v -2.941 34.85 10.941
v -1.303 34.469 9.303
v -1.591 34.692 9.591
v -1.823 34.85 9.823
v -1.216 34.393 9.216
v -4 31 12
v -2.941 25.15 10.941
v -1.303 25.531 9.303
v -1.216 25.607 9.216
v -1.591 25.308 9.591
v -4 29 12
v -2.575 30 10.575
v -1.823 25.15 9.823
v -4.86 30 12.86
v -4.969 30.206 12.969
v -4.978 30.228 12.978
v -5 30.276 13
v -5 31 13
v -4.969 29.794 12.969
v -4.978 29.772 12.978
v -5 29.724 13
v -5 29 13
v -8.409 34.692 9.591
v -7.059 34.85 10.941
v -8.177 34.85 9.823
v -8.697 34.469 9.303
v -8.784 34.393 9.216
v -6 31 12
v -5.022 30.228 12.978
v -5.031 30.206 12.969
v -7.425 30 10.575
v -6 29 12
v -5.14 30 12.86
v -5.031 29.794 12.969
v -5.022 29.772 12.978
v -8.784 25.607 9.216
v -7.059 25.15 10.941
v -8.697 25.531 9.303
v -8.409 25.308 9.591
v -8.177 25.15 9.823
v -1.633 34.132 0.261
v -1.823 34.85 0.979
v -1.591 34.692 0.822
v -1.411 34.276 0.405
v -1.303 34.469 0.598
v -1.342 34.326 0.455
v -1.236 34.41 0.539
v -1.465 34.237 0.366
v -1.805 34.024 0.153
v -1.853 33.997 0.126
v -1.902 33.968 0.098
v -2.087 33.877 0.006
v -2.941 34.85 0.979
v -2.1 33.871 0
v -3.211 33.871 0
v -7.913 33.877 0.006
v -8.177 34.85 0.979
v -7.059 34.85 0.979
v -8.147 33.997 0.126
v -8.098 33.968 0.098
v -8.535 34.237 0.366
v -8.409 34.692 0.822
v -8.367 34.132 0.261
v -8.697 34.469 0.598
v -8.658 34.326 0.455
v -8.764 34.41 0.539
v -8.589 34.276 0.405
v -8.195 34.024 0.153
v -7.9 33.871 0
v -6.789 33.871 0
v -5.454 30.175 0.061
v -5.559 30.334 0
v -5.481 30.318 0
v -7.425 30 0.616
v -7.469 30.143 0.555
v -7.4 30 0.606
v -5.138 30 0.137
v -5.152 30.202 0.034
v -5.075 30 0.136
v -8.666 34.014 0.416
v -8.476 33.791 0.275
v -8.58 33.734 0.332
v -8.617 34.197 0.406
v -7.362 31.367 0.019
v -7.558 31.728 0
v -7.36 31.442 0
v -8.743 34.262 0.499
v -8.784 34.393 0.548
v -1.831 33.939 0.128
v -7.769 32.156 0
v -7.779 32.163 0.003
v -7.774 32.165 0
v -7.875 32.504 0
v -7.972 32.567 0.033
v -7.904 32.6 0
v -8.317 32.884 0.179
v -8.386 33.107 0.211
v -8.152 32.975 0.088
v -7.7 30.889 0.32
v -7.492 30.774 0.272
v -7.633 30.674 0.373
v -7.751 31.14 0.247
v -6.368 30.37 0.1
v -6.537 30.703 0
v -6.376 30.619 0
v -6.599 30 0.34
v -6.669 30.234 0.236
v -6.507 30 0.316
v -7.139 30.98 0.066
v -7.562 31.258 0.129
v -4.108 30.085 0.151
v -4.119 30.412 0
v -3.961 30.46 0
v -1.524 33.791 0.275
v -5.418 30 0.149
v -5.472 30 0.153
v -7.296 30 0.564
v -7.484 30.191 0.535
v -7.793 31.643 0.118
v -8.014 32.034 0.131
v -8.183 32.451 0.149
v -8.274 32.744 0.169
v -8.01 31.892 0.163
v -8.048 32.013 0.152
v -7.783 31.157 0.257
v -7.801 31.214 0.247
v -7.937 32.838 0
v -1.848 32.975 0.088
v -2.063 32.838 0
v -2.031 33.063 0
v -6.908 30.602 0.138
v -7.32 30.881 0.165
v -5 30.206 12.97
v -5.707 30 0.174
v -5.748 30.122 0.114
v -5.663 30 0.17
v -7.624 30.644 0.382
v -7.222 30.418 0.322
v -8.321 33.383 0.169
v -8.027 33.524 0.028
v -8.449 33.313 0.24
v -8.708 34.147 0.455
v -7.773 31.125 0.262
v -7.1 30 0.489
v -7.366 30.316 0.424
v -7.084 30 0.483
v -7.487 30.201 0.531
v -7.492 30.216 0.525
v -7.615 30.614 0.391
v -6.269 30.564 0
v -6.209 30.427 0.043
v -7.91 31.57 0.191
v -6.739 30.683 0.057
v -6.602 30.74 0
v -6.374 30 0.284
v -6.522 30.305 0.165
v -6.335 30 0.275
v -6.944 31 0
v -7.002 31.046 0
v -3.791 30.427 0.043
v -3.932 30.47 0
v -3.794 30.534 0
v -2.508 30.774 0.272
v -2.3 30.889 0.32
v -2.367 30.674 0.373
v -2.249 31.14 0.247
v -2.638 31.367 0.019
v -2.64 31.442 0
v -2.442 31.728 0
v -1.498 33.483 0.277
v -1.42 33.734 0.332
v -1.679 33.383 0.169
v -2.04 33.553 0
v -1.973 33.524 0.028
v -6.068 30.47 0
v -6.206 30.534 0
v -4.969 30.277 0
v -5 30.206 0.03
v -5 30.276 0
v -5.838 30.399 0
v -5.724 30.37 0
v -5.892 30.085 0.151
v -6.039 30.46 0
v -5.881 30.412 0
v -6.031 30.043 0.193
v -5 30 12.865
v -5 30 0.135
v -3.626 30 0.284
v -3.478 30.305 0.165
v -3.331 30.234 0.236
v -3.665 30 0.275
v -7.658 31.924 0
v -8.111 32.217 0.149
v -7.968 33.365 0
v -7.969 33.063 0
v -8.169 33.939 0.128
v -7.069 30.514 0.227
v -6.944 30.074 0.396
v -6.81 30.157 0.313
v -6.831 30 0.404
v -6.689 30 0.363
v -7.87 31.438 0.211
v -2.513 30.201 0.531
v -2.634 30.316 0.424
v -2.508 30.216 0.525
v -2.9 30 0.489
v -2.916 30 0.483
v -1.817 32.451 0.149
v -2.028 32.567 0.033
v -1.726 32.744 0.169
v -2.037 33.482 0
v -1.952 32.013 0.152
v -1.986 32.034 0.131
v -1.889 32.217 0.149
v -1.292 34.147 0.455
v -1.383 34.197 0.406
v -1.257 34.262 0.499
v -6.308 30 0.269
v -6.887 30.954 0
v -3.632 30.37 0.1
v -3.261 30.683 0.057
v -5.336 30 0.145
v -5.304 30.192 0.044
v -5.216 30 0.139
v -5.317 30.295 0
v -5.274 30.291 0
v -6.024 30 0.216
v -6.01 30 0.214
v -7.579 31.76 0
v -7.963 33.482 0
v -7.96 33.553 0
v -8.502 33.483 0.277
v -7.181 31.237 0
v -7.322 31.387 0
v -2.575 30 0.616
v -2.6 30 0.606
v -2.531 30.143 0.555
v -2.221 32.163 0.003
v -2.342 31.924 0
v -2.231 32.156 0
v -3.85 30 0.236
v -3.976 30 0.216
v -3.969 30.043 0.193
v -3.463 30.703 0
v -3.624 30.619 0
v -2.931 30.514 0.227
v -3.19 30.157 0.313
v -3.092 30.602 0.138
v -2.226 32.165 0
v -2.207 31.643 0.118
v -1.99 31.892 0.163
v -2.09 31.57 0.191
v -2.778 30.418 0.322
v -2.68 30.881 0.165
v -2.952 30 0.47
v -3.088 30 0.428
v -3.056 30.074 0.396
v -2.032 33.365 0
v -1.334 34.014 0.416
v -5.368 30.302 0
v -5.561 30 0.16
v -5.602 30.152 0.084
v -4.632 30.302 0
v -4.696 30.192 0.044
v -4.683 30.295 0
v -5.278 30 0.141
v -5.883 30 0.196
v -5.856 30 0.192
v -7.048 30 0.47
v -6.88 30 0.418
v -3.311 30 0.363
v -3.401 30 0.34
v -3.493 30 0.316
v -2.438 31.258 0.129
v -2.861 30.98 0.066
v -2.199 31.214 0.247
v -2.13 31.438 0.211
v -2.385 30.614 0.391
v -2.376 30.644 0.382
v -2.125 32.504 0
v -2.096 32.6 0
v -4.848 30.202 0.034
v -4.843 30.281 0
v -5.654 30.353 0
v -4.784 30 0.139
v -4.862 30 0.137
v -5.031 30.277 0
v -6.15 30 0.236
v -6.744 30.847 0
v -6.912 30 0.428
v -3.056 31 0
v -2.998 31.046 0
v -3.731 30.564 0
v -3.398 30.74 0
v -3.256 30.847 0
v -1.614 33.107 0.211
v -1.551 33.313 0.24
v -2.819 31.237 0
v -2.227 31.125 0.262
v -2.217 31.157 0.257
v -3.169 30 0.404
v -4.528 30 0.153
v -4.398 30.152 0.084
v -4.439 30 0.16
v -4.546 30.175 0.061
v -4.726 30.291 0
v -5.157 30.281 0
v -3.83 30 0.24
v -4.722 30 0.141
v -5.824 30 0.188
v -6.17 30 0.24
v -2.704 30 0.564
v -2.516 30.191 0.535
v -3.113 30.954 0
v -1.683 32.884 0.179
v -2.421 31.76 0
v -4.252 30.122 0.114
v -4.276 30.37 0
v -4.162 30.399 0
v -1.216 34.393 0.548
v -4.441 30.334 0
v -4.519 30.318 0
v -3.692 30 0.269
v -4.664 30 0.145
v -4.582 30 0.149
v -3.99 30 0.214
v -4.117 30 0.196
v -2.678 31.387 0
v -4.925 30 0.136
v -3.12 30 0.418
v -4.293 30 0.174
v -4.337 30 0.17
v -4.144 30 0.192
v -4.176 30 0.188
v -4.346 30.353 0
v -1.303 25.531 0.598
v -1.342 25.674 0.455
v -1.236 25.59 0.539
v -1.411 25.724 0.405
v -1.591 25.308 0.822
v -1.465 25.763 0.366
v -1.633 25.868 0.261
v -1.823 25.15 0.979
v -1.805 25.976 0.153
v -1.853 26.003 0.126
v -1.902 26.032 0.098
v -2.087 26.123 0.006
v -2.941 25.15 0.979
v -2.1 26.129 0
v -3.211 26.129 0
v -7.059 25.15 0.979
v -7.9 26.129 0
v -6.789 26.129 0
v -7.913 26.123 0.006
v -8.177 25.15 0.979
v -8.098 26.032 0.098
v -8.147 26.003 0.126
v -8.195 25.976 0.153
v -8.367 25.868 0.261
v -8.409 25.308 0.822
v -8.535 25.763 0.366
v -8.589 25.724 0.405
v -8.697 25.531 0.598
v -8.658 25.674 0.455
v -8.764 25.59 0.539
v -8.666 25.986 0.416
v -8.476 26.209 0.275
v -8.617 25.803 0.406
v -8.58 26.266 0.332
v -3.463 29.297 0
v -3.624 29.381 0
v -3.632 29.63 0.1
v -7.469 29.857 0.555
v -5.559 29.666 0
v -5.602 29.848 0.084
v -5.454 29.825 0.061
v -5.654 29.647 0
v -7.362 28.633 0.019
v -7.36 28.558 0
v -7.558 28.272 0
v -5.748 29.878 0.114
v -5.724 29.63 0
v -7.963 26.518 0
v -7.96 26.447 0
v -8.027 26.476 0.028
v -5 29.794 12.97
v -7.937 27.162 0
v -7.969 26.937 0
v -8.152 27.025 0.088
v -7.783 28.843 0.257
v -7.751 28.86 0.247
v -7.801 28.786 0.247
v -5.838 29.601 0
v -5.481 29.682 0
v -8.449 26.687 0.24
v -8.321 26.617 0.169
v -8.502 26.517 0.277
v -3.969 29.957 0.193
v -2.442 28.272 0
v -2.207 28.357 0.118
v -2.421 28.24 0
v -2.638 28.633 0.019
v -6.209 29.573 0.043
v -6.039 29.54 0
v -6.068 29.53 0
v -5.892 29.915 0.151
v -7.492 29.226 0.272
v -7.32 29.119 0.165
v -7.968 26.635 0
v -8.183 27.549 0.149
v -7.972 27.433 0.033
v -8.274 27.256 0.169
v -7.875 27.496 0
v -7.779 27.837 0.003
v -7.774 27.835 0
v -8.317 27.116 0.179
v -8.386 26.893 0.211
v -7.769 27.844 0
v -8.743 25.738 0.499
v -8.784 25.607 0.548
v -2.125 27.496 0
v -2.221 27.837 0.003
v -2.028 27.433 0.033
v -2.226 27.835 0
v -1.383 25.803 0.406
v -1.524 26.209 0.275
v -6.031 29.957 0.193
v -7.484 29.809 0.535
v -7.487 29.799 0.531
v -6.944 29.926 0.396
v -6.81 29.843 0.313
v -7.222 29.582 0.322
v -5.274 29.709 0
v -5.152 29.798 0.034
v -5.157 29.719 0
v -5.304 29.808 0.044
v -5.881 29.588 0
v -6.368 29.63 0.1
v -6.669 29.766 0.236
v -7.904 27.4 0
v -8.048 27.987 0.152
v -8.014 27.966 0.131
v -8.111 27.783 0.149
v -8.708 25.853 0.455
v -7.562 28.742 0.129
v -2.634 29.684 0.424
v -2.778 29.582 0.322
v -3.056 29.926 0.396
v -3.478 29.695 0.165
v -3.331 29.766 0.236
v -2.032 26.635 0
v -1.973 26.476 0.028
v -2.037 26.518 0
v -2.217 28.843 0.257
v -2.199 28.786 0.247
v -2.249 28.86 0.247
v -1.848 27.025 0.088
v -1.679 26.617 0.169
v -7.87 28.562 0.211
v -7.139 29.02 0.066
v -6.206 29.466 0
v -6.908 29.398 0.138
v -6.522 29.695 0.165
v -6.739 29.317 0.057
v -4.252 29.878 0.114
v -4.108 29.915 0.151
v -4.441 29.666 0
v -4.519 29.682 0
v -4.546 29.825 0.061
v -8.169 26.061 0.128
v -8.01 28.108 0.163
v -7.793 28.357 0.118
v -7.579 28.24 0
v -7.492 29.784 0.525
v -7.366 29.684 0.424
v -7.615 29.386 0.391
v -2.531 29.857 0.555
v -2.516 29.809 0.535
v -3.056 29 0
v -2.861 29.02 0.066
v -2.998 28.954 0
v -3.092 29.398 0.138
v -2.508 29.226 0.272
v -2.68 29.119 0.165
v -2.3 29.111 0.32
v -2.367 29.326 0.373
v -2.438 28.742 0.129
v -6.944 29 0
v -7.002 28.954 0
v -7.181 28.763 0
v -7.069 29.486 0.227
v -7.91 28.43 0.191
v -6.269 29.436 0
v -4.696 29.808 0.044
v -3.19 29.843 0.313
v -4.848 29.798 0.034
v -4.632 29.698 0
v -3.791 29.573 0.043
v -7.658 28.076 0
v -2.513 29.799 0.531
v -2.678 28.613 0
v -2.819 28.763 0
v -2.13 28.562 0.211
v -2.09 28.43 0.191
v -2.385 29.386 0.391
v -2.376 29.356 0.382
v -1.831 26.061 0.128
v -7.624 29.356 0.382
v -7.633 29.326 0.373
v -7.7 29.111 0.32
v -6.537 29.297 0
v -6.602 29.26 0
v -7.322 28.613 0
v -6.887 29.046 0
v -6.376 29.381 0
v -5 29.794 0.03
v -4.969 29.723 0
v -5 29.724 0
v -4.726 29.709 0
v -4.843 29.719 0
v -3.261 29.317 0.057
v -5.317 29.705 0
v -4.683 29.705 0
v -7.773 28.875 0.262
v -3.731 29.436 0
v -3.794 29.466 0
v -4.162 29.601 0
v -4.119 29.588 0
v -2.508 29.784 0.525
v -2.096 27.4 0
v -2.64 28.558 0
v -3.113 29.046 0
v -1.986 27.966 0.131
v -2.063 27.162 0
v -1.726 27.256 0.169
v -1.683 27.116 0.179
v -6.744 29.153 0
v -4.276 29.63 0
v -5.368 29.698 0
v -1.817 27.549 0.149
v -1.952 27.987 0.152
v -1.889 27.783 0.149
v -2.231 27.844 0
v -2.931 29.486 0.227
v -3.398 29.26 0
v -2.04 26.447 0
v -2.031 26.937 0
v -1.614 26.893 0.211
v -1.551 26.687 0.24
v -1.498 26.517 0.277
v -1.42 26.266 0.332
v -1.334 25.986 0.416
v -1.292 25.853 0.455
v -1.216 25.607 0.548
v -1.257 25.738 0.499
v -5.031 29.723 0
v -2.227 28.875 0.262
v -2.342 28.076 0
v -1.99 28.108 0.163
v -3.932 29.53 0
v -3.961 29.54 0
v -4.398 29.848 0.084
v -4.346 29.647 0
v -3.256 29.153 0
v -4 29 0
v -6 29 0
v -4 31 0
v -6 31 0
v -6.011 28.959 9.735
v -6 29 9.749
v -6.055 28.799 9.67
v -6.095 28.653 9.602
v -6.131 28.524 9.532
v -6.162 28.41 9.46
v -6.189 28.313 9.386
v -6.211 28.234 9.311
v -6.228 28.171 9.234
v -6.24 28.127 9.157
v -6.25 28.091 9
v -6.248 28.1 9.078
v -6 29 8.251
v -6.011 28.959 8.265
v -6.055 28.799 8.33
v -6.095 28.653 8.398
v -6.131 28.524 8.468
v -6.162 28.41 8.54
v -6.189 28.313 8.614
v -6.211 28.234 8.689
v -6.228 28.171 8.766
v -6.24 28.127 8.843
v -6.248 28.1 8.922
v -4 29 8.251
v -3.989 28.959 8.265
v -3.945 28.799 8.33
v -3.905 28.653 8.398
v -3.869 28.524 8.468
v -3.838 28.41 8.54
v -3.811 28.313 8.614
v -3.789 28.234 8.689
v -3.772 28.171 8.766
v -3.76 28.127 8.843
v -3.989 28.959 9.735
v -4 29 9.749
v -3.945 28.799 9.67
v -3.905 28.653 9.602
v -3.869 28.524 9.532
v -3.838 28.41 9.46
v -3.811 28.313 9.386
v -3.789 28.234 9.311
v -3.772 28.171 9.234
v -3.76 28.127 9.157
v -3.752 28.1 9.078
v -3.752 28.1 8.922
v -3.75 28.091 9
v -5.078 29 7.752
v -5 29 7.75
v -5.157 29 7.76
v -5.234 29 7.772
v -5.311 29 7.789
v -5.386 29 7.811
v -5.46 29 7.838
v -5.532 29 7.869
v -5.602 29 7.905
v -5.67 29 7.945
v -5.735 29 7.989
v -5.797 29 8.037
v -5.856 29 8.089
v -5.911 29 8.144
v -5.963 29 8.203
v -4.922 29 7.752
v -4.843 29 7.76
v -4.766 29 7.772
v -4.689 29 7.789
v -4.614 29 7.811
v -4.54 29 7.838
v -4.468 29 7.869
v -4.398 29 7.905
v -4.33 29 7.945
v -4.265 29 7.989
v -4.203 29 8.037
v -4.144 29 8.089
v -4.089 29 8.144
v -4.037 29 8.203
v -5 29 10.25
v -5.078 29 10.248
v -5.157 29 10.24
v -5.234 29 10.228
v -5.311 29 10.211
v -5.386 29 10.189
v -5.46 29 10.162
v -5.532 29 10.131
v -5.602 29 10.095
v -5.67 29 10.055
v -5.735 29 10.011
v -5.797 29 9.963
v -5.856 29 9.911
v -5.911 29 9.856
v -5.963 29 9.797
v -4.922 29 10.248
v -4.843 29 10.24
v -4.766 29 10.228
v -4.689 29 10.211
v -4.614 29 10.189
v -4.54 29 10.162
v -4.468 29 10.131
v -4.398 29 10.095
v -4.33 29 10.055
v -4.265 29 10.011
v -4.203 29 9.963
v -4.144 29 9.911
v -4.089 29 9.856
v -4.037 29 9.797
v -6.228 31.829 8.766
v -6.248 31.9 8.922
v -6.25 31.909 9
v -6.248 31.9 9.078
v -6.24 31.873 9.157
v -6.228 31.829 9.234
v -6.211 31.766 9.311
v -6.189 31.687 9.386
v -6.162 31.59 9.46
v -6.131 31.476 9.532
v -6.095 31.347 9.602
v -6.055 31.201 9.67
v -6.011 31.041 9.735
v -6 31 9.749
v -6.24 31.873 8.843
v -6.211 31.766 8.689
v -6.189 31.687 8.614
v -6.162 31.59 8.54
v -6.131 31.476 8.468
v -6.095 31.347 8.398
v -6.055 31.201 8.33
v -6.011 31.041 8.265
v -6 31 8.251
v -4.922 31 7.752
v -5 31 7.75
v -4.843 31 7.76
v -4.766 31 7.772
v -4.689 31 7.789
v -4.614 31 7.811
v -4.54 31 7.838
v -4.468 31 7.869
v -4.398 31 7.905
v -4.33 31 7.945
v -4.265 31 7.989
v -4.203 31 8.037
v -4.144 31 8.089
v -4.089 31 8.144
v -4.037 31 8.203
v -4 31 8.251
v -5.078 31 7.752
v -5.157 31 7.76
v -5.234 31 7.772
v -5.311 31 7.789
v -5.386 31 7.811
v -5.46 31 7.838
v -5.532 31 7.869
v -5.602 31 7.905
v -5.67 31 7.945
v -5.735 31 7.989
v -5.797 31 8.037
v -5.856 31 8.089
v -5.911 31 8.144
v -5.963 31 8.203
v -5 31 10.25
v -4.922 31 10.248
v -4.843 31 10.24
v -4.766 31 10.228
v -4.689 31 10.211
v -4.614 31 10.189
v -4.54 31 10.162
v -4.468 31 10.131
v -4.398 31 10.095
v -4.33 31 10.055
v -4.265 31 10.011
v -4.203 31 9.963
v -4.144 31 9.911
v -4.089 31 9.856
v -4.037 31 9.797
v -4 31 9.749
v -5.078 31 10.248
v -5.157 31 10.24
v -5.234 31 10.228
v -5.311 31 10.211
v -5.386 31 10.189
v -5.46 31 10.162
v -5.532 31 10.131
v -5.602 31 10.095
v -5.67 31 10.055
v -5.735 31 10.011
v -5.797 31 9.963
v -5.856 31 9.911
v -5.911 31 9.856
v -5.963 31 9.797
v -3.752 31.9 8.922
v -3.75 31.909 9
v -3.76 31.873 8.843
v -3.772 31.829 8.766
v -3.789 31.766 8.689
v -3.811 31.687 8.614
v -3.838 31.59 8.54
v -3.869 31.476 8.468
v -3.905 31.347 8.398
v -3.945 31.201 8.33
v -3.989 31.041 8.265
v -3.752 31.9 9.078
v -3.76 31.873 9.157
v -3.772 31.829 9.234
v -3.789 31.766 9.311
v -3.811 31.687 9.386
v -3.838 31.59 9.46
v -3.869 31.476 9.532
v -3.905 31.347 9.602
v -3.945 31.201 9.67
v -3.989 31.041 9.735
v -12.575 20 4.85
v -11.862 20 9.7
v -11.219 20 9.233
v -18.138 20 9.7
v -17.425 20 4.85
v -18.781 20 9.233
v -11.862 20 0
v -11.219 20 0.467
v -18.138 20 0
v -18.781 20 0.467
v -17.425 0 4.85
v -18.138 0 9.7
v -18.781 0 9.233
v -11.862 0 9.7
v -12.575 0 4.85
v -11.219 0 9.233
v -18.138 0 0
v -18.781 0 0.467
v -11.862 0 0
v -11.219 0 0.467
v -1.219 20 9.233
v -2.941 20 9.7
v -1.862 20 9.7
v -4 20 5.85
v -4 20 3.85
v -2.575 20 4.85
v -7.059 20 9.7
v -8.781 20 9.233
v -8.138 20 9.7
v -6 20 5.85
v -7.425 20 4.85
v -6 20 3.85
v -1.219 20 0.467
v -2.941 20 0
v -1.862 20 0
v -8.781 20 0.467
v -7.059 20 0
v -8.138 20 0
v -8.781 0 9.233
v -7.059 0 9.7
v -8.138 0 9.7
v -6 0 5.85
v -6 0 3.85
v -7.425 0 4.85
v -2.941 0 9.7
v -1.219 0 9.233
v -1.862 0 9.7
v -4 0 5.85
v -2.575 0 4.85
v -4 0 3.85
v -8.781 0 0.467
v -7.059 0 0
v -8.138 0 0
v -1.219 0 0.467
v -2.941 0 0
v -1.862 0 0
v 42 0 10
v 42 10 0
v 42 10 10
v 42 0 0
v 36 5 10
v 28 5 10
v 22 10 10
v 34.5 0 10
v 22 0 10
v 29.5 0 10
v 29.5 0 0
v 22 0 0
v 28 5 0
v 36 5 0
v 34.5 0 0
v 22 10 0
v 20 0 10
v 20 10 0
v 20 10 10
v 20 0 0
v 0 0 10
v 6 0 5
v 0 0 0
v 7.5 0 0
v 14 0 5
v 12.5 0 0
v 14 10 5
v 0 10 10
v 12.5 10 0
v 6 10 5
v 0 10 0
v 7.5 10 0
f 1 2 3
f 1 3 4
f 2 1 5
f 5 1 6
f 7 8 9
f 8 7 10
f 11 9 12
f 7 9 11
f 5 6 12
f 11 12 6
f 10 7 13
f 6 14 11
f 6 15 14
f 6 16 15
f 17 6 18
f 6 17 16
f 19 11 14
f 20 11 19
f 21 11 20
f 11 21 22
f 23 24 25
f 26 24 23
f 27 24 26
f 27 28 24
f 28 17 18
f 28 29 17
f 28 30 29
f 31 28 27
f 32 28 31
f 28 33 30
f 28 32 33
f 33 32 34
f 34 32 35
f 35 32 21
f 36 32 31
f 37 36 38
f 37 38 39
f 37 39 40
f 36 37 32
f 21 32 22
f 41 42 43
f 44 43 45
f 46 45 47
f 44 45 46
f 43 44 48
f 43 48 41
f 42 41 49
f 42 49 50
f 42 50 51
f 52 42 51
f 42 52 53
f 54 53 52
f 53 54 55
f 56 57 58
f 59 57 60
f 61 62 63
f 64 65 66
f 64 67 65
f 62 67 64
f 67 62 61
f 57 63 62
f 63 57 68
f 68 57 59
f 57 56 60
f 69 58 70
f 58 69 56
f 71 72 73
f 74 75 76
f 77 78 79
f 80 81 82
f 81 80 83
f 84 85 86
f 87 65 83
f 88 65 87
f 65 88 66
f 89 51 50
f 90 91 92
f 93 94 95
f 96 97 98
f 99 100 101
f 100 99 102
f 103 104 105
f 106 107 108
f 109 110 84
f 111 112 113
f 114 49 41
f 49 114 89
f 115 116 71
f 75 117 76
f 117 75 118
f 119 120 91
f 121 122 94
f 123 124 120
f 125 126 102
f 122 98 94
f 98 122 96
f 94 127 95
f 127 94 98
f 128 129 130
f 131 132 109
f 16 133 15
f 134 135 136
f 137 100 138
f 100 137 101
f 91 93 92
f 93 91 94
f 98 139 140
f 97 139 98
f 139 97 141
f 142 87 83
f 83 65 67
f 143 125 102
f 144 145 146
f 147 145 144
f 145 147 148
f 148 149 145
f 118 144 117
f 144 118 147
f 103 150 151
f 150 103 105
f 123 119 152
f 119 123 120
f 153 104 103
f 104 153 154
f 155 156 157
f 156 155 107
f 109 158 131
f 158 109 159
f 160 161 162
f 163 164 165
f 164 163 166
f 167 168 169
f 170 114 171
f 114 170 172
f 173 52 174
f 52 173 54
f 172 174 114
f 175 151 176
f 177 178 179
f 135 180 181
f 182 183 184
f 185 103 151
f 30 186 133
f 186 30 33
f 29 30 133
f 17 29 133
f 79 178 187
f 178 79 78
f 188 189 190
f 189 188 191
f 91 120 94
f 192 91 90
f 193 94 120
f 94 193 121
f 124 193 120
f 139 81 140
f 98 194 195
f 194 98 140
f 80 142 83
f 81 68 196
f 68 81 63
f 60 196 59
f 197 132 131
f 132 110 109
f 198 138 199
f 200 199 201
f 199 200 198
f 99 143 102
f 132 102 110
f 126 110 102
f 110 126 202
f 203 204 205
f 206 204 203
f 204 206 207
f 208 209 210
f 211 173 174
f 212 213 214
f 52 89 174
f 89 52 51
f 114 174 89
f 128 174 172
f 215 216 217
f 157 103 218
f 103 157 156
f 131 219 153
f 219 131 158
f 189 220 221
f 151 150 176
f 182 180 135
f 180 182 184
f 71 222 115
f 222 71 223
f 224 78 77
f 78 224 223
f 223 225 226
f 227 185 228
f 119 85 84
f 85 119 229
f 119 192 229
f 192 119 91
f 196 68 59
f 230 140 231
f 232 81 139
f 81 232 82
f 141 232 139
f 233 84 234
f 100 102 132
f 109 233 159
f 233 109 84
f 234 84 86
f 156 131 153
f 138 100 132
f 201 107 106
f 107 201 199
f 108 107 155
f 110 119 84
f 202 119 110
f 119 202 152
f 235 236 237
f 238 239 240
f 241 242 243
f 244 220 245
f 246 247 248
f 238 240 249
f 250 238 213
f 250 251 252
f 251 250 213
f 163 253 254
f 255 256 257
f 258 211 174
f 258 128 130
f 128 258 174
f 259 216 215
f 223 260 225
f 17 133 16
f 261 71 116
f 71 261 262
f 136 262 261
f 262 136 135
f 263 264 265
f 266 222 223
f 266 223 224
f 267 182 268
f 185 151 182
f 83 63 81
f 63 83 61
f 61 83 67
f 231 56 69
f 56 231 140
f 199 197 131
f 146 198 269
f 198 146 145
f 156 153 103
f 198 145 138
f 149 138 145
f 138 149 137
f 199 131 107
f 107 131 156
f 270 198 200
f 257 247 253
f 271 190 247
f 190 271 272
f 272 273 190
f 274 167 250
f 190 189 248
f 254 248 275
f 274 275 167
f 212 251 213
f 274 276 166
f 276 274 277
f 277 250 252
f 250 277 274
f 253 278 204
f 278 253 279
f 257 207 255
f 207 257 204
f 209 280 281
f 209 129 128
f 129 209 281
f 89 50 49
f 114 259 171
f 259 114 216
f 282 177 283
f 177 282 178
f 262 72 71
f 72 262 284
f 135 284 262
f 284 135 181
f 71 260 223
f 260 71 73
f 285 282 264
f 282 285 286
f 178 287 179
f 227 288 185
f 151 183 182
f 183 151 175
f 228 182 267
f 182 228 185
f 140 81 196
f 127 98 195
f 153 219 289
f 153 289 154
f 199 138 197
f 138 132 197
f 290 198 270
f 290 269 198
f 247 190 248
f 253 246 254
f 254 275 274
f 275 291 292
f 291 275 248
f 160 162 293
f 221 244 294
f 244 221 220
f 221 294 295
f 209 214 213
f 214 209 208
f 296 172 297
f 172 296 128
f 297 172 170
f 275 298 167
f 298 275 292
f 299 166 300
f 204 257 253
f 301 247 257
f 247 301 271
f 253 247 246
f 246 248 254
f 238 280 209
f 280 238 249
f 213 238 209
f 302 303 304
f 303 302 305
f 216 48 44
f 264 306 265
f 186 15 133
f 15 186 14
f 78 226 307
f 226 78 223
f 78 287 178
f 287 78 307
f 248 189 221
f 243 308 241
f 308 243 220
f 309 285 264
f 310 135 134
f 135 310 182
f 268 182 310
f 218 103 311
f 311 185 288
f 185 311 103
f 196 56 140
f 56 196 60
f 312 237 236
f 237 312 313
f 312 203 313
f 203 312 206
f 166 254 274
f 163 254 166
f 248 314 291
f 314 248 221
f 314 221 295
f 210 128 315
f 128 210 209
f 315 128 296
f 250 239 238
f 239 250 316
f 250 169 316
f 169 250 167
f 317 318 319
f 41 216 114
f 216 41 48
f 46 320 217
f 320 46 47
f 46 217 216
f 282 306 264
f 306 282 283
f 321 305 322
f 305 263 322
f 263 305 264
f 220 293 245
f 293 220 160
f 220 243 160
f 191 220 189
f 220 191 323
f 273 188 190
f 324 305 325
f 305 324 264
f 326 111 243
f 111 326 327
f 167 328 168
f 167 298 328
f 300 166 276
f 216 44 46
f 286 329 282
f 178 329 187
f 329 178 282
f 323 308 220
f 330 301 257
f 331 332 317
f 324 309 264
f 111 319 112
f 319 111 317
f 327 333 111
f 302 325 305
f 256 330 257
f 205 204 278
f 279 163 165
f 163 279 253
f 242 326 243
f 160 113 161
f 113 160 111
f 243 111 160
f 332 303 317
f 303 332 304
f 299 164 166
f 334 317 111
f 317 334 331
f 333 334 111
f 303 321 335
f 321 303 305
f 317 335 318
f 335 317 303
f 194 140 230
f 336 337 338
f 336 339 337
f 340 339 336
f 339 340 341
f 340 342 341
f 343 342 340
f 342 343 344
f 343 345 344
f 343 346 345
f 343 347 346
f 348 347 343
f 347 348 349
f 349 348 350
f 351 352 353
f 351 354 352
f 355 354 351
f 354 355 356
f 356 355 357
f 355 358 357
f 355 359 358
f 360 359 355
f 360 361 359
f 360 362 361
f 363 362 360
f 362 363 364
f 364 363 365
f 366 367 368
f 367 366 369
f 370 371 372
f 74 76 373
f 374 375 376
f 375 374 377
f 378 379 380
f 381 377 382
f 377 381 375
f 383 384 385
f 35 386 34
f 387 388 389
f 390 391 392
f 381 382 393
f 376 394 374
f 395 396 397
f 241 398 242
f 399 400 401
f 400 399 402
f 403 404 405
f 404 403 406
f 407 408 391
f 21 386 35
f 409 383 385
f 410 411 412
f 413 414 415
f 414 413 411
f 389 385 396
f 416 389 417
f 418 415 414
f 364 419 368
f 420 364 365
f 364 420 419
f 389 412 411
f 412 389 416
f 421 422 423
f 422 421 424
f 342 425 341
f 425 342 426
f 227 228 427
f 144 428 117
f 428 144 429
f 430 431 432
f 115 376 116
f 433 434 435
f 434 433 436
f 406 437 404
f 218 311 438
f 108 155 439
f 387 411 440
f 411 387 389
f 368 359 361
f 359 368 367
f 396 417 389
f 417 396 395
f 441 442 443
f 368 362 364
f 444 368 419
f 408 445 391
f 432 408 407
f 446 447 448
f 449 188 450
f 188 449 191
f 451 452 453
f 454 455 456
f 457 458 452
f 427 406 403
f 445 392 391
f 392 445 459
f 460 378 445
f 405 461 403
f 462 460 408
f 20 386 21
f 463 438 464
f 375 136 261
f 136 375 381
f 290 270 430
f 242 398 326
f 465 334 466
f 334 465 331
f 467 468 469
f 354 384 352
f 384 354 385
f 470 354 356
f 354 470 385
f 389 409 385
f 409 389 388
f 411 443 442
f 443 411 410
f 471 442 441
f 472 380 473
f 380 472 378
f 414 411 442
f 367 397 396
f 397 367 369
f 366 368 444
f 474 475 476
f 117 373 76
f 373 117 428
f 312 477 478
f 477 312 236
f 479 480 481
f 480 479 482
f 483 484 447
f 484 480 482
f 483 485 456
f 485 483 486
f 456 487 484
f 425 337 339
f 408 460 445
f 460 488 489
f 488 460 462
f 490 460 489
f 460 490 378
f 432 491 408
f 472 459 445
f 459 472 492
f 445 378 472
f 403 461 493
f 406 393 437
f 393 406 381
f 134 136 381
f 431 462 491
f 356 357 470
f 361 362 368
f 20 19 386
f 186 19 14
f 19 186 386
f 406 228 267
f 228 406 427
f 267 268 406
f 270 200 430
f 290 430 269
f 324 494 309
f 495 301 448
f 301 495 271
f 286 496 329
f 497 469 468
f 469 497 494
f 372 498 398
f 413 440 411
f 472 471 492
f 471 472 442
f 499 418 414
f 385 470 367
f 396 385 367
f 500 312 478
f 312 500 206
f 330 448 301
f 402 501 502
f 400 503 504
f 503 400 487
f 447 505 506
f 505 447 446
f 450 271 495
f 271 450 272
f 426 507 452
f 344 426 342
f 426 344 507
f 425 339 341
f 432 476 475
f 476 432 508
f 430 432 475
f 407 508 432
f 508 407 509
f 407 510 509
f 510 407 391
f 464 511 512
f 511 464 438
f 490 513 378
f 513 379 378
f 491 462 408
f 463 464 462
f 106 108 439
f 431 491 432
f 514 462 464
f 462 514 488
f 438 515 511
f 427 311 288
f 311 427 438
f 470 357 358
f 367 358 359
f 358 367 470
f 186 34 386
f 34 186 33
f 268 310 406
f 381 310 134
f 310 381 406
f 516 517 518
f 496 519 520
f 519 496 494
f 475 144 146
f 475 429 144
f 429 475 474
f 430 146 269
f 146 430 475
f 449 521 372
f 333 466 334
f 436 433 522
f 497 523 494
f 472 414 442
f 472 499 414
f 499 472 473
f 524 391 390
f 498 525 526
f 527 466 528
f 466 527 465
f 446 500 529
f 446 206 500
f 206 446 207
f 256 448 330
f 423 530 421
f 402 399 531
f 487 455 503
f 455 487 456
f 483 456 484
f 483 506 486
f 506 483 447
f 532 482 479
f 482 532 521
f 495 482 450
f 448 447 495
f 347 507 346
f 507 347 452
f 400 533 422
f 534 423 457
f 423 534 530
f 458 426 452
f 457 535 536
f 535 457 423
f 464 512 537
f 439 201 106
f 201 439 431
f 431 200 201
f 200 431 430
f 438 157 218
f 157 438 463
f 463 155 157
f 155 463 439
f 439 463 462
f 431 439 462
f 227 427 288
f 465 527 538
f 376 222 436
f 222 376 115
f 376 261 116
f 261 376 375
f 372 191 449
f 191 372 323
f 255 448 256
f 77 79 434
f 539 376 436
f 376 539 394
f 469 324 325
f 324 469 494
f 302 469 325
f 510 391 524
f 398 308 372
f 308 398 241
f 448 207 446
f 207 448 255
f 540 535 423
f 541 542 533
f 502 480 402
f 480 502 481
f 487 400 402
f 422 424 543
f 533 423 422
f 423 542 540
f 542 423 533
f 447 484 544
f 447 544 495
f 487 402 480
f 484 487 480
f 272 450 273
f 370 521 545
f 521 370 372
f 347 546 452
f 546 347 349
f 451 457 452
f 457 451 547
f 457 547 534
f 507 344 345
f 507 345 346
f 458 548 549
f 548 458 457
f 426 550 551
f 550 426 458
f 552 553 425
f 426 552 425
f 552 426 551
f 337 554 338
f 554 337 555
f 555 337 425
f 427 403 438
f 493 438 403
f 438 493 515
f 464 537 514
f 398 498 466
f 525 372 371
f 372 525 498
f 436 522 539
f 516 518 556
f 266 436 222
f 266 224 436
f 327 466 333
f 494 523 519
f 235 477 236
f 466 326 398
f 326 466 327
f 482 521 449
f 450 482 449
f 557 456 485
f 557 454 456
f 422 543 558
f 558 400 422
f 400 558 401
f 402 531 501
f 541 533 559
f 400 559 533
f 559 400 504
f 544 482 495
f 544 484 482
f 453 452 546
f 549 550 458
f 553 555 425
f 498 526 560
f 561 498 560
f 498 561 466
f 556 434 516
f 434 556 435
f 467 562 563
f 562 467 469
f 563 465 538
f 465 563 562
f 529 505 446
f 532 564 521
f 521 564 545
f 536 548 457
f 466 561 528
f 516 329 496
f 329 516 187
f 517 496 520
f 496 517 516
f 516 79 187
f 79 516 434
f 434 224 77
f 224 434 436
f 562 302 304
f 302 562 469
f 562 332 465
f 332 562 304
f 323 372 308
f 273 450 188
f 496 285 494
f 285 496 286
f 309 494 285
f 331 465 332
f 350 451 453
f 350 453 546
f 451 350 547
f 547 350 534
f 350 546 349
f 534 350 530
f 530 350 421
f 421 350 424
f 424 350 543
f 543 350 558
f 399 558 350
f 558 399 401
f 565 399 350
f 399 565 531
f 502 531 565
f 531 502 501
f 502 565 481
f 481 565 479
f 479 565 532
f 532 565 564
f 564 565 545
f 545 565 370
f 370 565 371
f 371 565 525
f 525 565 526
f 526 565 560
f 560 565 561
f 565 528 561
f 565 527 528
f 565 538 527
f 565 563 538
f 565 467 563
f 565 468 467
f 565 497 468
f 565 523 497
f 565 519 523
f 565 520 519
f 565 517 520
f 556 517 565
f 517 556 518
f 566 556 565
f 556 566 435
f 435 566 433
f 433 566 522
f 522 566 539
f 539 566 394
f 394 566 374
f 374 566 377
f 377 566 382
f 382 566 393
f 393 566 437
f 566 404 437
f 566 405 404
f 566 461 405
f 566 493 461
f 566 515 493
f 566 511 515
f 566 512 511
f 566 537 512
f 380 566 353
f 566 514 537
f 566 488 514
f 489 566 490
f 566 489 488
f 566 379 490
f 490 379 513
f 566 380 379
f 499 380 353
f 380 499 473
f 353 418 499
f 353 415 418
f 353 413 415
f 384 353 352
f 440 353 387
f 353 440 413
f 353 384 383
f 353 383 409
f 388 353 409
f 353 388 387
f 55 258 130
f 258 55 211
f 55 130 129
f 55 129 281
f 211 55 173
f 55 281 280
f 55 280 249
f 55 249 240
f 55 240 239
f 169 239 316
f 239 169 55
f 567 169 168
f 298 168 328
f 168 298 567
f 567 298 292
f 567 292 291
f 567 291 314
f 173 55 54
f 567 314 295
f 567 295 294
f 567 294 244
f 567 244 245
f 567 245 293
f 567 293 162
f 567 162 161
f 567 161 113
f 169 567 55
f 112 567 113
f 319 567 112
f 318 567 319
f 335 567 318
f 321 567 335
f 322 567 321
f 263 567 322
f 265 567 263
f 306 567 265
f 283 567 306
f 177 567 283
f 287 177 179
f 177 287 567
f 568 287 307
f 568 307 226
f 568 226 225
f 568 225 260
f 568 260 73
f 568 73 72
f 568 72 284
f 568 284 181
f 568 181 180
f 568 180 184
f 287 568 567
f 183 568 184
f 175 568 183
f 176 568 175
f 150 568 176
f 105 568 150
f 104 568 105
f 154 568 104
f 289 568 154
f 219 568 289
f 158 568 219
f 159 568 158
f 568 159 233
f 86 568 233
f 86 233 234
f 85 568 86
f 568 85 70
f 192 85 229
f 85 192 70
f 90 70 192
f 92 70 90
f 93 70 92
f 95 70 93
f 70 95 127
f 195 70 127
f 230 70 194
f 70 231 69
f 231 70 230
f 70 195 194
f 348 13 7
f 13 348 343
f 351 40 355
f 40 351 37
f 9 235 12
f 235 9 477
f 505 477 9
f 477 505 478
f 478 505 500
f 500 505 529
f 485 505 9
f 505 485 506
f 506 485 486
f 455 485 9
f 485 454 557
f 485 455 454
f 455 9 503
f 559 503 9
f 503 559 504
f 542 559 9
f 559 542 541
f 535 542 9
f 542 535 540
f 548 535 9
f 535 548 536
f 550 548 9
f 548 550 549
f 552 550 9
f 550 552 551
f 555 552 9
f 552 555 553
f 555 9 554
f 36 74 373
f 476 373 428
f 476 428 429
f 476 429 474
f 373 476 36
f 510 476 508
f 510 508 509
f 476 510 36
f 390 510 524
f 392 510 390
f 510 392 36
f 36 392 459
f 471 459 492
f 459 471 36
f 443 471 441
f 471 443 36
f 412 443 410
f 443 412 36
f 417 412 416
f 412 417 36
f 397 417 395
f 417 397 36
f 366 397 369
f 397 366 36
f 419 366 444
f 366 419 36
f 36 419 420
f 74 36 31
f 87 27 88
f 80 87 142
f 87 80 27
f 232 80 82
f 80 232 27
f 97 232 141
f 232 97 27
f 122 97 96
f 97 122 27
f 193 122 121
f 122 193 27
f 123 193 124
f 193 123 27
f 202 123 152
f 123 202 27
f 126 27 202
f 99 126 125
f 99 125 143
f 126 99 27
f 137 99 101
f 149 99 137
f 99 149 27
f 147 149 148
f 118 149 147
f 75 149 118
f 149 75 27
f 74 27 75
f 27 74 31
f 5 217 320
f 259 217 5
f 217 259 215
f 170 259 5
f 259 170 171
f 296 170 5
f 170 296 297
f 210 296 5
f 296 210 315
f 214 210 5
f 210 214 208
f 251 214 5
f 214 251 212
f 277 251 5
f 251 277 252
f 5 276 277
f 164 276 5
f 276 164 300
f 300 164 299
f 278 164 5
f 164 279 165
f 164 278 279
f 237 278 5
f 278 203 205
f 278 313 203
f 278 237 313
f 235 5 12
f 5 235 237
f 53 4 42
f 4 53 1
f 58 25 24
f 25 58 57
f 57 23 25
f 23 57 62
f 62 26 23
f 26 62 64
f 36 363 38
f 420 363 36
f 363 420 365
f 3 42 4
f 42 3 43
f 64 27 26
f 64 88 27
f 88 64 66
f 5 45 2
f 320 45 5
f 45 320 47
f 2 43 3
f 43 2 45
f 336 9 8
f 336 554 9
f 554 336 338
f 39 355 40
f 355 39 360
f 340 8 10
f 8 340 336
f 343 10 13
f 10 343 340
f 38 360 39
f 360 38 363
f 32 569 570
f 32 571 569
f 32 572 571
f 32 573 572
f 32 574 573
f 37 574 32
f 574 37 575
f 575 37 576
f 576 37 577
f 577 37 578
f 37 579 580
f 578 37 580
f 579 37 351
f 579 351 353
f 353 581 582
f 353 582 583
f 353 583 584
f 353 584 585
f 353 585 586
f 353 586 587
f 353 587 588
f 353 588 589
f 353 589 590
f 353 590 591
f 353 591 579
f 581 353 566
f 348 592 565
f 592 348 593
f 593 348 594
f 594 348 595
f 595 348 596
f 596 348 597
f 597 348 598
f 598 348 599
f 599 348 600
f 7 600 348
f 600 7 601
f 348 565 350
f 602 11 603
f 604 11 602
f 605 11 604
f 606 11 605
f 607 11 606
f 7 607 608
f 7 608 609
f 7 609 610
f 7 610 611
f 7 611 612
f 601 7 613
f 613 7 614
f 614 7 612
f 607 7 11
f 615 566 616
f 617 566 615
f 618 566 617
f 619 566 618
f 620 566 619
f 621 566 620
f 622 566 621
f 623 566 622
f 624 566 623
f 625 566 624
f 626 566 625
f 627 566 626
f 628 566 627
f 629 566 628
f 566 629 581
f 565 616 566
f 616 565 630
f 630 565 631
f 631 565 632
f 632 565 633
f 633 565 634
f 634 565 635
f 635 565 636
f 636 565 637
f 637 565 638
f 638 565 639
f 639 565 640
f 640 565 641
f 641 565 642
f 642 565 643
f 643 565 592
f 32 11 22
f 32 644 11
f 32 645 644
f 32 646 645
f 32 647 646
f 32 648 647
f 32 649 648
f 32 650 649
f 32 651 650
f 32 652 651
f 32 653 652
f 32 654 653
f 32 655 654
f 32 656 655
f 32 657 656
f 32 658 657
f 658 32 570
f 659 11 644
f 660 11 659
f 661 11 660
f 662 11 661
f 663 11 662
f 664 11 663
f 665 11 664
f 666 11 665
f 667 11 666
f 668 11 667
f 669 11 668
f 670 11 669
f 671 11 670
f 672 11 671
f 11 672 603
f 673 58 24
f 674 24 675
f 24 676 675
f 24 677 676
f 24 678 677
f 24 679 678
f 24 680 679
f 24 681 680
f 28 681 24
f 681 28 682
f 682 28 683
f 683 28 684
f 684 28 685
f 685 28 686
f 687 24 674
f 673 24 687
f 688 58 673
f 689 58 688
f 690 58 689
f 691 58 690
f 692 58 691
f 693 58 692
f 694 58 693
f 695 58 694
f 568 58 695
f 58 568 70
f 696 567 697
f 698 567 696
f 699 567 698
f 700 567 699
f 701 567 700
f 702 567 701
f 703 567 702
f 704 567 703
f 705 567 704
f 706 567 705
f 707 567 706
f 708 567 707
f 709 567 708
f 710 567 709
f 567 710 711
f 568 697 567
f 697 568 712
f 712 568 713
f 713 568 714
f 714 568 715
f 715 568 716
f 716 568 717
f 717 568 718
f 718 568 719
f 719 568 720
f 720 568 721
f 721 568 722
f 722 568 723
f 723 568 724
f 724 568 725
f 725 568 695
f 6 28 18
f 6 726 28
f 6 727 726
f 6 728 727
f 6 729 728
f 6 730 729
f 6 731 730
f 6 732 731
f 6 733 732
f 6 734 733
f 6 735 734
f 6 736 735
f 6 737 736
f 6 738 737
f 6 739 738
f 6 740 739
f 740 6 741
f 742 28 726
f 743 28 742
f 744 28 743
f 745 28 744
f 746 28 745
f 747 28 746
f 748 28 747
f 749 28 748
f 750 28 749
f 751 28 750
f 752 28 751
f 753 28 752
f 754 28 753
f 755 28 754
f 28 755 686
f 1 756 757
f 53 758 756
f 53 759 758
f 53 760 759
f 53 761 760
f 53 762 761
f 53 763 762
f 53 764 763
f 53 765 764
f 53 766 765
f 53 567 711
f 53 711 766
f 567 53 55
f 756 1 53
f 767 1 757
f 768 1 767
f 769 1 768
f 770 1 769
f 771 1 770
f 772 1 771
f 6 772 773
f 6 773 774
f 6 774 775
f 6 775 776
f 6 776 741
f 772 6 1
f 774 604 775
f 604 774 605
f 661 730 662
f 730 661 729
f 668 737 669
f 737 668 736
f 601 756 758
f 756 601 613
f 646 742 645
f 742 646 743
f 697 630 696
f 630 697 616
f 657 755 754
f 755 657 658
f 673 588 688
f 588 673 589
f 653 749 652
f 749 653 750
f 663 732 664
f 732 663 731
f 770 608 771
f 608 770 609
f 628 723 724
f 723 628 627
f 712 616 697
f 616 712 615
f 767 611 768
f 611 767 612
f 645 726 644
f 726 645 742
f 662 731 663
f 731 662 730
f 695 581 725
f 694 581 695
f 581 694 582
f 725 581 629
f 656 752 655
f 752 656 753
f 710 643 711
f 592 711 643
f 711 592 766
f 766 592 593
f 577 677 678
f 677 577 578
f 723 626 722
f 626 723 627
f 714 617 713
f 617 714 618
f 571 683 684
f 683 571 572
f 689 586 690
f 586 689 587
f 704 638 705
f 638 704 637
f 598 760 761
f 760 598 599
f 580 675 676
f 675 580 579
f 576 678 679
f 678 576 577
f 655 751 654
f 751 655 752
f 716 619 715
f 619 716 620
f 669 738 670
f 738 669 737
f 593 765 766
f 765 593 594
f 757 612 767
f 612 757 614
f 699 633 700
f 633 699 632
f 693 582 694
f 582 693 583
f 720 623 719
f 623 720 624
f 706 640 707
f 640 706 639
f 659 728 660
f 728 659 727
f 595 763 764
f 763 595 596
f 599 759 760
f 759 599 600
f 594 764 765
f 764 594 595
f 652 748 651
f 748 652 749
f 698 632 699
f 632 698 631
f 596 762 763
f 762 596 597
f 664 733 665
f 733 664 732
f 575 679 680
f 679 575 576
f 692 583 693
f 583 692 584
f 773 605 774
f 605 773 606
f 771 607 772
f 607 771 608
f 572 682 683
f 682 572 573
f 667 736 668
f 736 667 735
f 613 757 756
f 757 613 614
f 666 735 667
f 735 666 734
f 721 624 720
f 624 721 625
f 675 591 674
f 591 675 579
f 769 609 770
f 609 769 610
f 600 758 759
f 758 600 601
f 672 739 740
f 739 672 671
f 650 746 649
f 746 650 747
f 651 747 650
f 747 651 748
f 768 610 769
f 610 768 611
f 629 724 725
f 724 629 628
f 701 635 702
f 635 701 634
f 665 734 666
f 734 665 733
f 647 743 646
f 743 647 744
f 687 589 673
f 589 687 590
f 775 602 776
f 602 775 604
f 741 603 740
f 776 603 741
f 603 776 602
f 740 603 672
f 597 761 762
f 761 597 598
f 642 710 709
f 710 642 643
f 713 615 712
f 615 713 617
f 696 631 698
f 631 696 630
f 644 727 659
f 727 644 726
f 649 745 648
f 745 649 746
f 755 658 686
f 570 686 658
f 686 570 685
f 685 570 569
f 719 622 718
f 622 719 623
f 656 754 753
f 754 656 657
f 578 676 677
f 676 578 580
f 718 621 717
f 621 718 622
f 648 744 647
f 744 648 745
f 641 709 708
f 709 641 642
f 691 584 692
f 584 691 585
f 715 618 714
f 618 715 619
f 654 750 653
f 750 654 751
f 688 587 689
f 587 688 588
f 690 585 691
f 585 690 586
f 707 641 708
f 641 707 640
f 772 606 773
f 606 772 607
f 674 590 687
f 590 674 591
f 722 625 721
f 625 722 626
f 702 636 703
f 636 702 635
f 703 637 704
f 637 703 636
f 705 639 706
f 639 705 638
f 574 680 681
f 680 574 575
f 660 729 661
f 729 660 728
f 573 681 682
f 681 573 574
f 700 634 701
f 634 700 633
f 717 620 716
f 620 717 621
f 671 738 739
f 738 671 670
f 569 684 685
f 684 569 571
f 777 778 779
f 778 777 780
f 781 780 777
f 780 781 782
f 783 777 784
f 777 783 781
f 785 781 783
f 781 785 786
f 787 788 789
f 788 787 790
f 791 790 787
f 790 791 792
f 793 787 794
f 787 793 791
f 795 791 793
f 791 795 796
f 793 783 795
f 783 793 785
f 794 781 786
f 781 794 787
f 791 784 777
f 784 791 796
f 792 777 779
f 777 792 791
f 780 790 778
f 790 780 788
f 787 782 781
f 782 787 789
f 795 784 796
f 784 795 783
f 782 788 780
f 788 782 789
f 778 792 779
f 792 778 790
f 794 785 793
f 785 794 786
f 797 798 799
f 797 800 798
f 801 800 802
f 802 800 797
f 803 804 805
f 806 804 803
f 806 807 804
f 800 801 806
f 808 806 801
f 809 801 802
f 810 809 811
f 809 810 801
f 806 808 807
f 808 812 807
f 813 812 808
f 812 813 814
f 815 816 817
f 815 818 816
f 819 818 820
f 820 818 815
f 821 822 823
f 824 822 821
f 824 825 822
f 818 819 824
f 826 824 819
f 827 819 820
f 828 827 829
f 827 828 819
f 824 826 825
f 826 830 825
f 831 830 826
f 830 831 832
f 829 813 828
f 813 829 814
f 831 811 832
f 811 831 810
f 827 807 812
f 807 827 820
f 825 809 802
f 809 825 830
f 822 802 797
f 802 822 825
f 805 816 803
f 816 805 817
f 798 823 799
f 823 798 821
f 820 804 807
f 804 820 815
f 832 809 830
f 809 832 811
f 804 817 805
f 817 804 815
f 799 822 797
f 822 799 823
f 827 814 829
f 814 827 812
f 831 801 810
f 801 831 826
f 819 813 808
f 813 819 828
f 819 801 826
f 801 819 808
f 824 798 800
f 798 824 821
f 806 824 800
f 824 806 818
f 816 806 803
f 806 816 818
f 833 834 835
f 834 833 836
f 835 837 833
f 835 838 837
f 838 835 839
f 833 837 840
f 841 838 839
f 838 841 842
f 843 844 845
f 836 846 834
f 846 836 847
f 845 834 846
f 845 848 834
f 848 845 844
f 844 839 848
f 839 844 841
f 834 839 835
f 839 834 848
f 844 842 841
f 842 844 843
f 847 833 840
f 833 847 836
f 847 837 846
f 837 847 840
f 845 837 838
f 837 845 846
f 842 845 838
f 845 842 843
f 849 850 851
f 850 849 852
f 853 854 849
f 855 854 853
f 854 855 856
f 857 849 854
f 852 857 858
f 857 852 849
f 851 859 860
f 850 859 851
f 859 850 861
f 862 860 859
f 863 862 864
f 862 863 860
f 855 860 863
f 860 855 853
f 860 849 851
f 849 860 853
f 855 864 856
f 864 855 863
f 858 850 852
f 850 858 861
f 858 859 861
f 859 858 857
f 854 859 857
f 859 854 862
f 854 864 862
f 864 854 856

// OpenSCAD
// file: long_bow_tie_experimental.scad
include <include.scad>;
include <globals.scad>;

use <long_bow_tie.scad>;

length = 50;

module split() {
    translate([0,0,-1]) linear_extrude(height=length+2) polygon(points=[[0,-1], [1,-1], [2.1,-5], [-2.1,-5], [-1,-1]]);
}

module long_bow_tie_split(length) {
    translate([0,0,male_dove_depth-slop]) rotate([90,0,0]) difference() {
        translate([0,-(male_dove_depth-slop),0]) rotate([-90,0,0]) long_bow_tie(length);
        split();
        rotate([0,0,180]) split();
    }
}

long_bow_tie_split(length);
// file: long_bow_tie.scad
tilt_level = 1.1;

include <include.scad>;
include <globals.scad>;

obj_leg = 12;

max_width=scaled_male_dove_max_width();
min_width=scaled_male_dove_min_width();
depth=scaled_male_dove_depth();
length = 50;

module bow_tie_master(length){
	union(){
		mirror([0,1,0])	dovetail_3d(max_width, min_width, depth, length);
		dovetail_3d(max_width, min_width, depth, length);
	}
}

module long_bow_tie(length) {
    translate([0,0,depth]) intersection(){
        rotate([90,0,0]) bow_tie_master(length);
        rotate([90,0,0]) cylinder(r=5.8, h=200);
    }
}

long_bow_tie(length);
// file: bow_tie.scad
smoothing = 100;
length = 13;
tilt_level = 1.1;
include <include.scad>;
include <globals.scad>;
use <long_bow_tie_experimental.scad>;

obj_leg= 12;
$fn = smoothing;
module bow_tie_master(){
	union(){
		intersection(){
            union() {
                intersection(){
                    rotate([0,-45,0]) cube([obj_leg,obj_leg,obj_leg]);
                    translate([-obj_leg/2,(obj_leg/2)-tilt_level,-5]) rotate([45,0,0]) cube([obj_leg,obj_leg,obj_leg*2]);
                    translate([0,length/4,length*.5]) rotate([45,0,0]) sphere(d=length*tilt_level);
                }
                mirror([0,1,0]) intersection(){
                    rotate([0,-45,0]) cube([obj_leg,obj_leg,obj_leg]);
                    translate([-obj_leg/2,(obj_leg/2)-tilt_level,-5]) rotate([45,0,0]) cube([obj_leg,obj_leg,obj_leg*2]);
                    translate([0,length/4,length*.5]) rotate([45,0,0]) sphere(d=length*tilt_level);
                }
            }
			rotate([-90,0,0]) translate([0,0,-scaled_male_dove_depth()]) long_bow_tie_split(length);
		}
	}
}
module bow_holes() {
	translate([-10,-2.5,-2.5]) rotate([0,90,0]) #cylinder(h=50, d=1.5);
	translate([-10,2.5,-2.5]) rotate([0,90,0]) #cylinder(h=50, d=1.5);
}

module bow_tie(){
	translate([0,0,13]) rotate([0,45*0,0]){
		difference(){
			rotate([0,180,0]) bow_tie_master();
			//bow_holes();
            translate([0,5,-4]) rotate([90,0,0]) cylinder(d=2.5, h=50);
		}
	}
}

bow_tie();
// file: globals.scad
/*
Most things in this file is represented as one millimeter, so keep that in mind while changing things.
Some of the setting are not mm but at variables that you can set, such as 2*x=2x and you are setting what x is.
I will try to specify when things are variables and not exact measurements.
*/

// printer slop
slop = 0.15;

obj_leg = 30;
leg_length = 5.5;
small_number = 0.001;
metal_core_rode_global = 5;


///////////////// number of holes /////////////////////
z_hole_number = 8;
other_holes = 8;

///////////////// Pins /////////////////////

//pins that poke out
ball_size = 10;
pin_height = 20;
pin_diameter = 6;


//holes
hole_ball_size = ball_size;
hole_pin_height = pin_height;
hole_pin_diameter = pin_diameter;

///////////////// Z THINGS /////////////////////

berring_slot_width = 7.5;
berring_slot_depth = 6.5;
metal_core_rode = 5;

///////////////// X THINGS /////////////////////

//male dove tails
male_dove_max_width=8;
male_dove_min_width=5;
male_dove_depth=5;
male_dove_height=obj_leg/2;

function scaled_male_dove_max_width() = male_dove_max_width - slop;
function scaled_male_dove_min_width() = male_dove_min_width - slop;
function scaled_male_dove_depth() = male_dove_depth - slop;

//female dove tails, this is found on the y mounts
girl_max_width=11;
girl_min_width=5;
girl_depth=5;
girl_height=obj_leg;


///////////////// Y THINGS /////////////////////
/*
The Y is so normal that all of those global variables at the top should change all of the setting in it, this section is set her incase there are variables set in the future development of this project.
*/

// stepper
motor_side_length = 43.2;
motor_bolt_hole_distance = 31;
motor_center_hole = 23;
motor_shaft_dia = 5;
motor_shaft_hole_dia = 5;

// bolts etc.
bolt_hole_dia = 3+2*slop;
bolt_head_hole_dia = 5.8;

m4_bolt_hole_dia = 4+2*slop;
m4_bolt_head_hole_dia = 6.8+2*slop;

m3_nut_side = 5.65;
m3_nut_height = 2.3;
m4_nut_side = 6.85;
m4_nut_height = 3.1;

// threaded rod
lifter_rod_diam = 9.86;
hole_threaded_rod = lifter_rod_diam+2*slop;

// for the extensions
metal_rod_size = 9;
// main file
length = 20;

include <globals.scad>;
include <include.scad>;
use <bow_tie.scad>;
use <long_bow_tie.scad>;
use <long_bow_tie_experimental.scad>;

slop = 0.15;

$fn=30;

translate([-5, 30, 0]) bow_tie();
translate([-15, 20, 0]) long_bow_tie(20); 
translate([-5, 20, 0]) long_bow_tie_split(20);

// half block
translate([22,0,0]) difference() {
    cube([20,10,10]);
    translate([10,00,0]) male_dovetail(10);
}

// overhang
translate([0,10,0]) rotate([90,0,0]) difference() {
    cube([20,10,10]);
    translate([10,00,0]) male_dovetail(10);
}
